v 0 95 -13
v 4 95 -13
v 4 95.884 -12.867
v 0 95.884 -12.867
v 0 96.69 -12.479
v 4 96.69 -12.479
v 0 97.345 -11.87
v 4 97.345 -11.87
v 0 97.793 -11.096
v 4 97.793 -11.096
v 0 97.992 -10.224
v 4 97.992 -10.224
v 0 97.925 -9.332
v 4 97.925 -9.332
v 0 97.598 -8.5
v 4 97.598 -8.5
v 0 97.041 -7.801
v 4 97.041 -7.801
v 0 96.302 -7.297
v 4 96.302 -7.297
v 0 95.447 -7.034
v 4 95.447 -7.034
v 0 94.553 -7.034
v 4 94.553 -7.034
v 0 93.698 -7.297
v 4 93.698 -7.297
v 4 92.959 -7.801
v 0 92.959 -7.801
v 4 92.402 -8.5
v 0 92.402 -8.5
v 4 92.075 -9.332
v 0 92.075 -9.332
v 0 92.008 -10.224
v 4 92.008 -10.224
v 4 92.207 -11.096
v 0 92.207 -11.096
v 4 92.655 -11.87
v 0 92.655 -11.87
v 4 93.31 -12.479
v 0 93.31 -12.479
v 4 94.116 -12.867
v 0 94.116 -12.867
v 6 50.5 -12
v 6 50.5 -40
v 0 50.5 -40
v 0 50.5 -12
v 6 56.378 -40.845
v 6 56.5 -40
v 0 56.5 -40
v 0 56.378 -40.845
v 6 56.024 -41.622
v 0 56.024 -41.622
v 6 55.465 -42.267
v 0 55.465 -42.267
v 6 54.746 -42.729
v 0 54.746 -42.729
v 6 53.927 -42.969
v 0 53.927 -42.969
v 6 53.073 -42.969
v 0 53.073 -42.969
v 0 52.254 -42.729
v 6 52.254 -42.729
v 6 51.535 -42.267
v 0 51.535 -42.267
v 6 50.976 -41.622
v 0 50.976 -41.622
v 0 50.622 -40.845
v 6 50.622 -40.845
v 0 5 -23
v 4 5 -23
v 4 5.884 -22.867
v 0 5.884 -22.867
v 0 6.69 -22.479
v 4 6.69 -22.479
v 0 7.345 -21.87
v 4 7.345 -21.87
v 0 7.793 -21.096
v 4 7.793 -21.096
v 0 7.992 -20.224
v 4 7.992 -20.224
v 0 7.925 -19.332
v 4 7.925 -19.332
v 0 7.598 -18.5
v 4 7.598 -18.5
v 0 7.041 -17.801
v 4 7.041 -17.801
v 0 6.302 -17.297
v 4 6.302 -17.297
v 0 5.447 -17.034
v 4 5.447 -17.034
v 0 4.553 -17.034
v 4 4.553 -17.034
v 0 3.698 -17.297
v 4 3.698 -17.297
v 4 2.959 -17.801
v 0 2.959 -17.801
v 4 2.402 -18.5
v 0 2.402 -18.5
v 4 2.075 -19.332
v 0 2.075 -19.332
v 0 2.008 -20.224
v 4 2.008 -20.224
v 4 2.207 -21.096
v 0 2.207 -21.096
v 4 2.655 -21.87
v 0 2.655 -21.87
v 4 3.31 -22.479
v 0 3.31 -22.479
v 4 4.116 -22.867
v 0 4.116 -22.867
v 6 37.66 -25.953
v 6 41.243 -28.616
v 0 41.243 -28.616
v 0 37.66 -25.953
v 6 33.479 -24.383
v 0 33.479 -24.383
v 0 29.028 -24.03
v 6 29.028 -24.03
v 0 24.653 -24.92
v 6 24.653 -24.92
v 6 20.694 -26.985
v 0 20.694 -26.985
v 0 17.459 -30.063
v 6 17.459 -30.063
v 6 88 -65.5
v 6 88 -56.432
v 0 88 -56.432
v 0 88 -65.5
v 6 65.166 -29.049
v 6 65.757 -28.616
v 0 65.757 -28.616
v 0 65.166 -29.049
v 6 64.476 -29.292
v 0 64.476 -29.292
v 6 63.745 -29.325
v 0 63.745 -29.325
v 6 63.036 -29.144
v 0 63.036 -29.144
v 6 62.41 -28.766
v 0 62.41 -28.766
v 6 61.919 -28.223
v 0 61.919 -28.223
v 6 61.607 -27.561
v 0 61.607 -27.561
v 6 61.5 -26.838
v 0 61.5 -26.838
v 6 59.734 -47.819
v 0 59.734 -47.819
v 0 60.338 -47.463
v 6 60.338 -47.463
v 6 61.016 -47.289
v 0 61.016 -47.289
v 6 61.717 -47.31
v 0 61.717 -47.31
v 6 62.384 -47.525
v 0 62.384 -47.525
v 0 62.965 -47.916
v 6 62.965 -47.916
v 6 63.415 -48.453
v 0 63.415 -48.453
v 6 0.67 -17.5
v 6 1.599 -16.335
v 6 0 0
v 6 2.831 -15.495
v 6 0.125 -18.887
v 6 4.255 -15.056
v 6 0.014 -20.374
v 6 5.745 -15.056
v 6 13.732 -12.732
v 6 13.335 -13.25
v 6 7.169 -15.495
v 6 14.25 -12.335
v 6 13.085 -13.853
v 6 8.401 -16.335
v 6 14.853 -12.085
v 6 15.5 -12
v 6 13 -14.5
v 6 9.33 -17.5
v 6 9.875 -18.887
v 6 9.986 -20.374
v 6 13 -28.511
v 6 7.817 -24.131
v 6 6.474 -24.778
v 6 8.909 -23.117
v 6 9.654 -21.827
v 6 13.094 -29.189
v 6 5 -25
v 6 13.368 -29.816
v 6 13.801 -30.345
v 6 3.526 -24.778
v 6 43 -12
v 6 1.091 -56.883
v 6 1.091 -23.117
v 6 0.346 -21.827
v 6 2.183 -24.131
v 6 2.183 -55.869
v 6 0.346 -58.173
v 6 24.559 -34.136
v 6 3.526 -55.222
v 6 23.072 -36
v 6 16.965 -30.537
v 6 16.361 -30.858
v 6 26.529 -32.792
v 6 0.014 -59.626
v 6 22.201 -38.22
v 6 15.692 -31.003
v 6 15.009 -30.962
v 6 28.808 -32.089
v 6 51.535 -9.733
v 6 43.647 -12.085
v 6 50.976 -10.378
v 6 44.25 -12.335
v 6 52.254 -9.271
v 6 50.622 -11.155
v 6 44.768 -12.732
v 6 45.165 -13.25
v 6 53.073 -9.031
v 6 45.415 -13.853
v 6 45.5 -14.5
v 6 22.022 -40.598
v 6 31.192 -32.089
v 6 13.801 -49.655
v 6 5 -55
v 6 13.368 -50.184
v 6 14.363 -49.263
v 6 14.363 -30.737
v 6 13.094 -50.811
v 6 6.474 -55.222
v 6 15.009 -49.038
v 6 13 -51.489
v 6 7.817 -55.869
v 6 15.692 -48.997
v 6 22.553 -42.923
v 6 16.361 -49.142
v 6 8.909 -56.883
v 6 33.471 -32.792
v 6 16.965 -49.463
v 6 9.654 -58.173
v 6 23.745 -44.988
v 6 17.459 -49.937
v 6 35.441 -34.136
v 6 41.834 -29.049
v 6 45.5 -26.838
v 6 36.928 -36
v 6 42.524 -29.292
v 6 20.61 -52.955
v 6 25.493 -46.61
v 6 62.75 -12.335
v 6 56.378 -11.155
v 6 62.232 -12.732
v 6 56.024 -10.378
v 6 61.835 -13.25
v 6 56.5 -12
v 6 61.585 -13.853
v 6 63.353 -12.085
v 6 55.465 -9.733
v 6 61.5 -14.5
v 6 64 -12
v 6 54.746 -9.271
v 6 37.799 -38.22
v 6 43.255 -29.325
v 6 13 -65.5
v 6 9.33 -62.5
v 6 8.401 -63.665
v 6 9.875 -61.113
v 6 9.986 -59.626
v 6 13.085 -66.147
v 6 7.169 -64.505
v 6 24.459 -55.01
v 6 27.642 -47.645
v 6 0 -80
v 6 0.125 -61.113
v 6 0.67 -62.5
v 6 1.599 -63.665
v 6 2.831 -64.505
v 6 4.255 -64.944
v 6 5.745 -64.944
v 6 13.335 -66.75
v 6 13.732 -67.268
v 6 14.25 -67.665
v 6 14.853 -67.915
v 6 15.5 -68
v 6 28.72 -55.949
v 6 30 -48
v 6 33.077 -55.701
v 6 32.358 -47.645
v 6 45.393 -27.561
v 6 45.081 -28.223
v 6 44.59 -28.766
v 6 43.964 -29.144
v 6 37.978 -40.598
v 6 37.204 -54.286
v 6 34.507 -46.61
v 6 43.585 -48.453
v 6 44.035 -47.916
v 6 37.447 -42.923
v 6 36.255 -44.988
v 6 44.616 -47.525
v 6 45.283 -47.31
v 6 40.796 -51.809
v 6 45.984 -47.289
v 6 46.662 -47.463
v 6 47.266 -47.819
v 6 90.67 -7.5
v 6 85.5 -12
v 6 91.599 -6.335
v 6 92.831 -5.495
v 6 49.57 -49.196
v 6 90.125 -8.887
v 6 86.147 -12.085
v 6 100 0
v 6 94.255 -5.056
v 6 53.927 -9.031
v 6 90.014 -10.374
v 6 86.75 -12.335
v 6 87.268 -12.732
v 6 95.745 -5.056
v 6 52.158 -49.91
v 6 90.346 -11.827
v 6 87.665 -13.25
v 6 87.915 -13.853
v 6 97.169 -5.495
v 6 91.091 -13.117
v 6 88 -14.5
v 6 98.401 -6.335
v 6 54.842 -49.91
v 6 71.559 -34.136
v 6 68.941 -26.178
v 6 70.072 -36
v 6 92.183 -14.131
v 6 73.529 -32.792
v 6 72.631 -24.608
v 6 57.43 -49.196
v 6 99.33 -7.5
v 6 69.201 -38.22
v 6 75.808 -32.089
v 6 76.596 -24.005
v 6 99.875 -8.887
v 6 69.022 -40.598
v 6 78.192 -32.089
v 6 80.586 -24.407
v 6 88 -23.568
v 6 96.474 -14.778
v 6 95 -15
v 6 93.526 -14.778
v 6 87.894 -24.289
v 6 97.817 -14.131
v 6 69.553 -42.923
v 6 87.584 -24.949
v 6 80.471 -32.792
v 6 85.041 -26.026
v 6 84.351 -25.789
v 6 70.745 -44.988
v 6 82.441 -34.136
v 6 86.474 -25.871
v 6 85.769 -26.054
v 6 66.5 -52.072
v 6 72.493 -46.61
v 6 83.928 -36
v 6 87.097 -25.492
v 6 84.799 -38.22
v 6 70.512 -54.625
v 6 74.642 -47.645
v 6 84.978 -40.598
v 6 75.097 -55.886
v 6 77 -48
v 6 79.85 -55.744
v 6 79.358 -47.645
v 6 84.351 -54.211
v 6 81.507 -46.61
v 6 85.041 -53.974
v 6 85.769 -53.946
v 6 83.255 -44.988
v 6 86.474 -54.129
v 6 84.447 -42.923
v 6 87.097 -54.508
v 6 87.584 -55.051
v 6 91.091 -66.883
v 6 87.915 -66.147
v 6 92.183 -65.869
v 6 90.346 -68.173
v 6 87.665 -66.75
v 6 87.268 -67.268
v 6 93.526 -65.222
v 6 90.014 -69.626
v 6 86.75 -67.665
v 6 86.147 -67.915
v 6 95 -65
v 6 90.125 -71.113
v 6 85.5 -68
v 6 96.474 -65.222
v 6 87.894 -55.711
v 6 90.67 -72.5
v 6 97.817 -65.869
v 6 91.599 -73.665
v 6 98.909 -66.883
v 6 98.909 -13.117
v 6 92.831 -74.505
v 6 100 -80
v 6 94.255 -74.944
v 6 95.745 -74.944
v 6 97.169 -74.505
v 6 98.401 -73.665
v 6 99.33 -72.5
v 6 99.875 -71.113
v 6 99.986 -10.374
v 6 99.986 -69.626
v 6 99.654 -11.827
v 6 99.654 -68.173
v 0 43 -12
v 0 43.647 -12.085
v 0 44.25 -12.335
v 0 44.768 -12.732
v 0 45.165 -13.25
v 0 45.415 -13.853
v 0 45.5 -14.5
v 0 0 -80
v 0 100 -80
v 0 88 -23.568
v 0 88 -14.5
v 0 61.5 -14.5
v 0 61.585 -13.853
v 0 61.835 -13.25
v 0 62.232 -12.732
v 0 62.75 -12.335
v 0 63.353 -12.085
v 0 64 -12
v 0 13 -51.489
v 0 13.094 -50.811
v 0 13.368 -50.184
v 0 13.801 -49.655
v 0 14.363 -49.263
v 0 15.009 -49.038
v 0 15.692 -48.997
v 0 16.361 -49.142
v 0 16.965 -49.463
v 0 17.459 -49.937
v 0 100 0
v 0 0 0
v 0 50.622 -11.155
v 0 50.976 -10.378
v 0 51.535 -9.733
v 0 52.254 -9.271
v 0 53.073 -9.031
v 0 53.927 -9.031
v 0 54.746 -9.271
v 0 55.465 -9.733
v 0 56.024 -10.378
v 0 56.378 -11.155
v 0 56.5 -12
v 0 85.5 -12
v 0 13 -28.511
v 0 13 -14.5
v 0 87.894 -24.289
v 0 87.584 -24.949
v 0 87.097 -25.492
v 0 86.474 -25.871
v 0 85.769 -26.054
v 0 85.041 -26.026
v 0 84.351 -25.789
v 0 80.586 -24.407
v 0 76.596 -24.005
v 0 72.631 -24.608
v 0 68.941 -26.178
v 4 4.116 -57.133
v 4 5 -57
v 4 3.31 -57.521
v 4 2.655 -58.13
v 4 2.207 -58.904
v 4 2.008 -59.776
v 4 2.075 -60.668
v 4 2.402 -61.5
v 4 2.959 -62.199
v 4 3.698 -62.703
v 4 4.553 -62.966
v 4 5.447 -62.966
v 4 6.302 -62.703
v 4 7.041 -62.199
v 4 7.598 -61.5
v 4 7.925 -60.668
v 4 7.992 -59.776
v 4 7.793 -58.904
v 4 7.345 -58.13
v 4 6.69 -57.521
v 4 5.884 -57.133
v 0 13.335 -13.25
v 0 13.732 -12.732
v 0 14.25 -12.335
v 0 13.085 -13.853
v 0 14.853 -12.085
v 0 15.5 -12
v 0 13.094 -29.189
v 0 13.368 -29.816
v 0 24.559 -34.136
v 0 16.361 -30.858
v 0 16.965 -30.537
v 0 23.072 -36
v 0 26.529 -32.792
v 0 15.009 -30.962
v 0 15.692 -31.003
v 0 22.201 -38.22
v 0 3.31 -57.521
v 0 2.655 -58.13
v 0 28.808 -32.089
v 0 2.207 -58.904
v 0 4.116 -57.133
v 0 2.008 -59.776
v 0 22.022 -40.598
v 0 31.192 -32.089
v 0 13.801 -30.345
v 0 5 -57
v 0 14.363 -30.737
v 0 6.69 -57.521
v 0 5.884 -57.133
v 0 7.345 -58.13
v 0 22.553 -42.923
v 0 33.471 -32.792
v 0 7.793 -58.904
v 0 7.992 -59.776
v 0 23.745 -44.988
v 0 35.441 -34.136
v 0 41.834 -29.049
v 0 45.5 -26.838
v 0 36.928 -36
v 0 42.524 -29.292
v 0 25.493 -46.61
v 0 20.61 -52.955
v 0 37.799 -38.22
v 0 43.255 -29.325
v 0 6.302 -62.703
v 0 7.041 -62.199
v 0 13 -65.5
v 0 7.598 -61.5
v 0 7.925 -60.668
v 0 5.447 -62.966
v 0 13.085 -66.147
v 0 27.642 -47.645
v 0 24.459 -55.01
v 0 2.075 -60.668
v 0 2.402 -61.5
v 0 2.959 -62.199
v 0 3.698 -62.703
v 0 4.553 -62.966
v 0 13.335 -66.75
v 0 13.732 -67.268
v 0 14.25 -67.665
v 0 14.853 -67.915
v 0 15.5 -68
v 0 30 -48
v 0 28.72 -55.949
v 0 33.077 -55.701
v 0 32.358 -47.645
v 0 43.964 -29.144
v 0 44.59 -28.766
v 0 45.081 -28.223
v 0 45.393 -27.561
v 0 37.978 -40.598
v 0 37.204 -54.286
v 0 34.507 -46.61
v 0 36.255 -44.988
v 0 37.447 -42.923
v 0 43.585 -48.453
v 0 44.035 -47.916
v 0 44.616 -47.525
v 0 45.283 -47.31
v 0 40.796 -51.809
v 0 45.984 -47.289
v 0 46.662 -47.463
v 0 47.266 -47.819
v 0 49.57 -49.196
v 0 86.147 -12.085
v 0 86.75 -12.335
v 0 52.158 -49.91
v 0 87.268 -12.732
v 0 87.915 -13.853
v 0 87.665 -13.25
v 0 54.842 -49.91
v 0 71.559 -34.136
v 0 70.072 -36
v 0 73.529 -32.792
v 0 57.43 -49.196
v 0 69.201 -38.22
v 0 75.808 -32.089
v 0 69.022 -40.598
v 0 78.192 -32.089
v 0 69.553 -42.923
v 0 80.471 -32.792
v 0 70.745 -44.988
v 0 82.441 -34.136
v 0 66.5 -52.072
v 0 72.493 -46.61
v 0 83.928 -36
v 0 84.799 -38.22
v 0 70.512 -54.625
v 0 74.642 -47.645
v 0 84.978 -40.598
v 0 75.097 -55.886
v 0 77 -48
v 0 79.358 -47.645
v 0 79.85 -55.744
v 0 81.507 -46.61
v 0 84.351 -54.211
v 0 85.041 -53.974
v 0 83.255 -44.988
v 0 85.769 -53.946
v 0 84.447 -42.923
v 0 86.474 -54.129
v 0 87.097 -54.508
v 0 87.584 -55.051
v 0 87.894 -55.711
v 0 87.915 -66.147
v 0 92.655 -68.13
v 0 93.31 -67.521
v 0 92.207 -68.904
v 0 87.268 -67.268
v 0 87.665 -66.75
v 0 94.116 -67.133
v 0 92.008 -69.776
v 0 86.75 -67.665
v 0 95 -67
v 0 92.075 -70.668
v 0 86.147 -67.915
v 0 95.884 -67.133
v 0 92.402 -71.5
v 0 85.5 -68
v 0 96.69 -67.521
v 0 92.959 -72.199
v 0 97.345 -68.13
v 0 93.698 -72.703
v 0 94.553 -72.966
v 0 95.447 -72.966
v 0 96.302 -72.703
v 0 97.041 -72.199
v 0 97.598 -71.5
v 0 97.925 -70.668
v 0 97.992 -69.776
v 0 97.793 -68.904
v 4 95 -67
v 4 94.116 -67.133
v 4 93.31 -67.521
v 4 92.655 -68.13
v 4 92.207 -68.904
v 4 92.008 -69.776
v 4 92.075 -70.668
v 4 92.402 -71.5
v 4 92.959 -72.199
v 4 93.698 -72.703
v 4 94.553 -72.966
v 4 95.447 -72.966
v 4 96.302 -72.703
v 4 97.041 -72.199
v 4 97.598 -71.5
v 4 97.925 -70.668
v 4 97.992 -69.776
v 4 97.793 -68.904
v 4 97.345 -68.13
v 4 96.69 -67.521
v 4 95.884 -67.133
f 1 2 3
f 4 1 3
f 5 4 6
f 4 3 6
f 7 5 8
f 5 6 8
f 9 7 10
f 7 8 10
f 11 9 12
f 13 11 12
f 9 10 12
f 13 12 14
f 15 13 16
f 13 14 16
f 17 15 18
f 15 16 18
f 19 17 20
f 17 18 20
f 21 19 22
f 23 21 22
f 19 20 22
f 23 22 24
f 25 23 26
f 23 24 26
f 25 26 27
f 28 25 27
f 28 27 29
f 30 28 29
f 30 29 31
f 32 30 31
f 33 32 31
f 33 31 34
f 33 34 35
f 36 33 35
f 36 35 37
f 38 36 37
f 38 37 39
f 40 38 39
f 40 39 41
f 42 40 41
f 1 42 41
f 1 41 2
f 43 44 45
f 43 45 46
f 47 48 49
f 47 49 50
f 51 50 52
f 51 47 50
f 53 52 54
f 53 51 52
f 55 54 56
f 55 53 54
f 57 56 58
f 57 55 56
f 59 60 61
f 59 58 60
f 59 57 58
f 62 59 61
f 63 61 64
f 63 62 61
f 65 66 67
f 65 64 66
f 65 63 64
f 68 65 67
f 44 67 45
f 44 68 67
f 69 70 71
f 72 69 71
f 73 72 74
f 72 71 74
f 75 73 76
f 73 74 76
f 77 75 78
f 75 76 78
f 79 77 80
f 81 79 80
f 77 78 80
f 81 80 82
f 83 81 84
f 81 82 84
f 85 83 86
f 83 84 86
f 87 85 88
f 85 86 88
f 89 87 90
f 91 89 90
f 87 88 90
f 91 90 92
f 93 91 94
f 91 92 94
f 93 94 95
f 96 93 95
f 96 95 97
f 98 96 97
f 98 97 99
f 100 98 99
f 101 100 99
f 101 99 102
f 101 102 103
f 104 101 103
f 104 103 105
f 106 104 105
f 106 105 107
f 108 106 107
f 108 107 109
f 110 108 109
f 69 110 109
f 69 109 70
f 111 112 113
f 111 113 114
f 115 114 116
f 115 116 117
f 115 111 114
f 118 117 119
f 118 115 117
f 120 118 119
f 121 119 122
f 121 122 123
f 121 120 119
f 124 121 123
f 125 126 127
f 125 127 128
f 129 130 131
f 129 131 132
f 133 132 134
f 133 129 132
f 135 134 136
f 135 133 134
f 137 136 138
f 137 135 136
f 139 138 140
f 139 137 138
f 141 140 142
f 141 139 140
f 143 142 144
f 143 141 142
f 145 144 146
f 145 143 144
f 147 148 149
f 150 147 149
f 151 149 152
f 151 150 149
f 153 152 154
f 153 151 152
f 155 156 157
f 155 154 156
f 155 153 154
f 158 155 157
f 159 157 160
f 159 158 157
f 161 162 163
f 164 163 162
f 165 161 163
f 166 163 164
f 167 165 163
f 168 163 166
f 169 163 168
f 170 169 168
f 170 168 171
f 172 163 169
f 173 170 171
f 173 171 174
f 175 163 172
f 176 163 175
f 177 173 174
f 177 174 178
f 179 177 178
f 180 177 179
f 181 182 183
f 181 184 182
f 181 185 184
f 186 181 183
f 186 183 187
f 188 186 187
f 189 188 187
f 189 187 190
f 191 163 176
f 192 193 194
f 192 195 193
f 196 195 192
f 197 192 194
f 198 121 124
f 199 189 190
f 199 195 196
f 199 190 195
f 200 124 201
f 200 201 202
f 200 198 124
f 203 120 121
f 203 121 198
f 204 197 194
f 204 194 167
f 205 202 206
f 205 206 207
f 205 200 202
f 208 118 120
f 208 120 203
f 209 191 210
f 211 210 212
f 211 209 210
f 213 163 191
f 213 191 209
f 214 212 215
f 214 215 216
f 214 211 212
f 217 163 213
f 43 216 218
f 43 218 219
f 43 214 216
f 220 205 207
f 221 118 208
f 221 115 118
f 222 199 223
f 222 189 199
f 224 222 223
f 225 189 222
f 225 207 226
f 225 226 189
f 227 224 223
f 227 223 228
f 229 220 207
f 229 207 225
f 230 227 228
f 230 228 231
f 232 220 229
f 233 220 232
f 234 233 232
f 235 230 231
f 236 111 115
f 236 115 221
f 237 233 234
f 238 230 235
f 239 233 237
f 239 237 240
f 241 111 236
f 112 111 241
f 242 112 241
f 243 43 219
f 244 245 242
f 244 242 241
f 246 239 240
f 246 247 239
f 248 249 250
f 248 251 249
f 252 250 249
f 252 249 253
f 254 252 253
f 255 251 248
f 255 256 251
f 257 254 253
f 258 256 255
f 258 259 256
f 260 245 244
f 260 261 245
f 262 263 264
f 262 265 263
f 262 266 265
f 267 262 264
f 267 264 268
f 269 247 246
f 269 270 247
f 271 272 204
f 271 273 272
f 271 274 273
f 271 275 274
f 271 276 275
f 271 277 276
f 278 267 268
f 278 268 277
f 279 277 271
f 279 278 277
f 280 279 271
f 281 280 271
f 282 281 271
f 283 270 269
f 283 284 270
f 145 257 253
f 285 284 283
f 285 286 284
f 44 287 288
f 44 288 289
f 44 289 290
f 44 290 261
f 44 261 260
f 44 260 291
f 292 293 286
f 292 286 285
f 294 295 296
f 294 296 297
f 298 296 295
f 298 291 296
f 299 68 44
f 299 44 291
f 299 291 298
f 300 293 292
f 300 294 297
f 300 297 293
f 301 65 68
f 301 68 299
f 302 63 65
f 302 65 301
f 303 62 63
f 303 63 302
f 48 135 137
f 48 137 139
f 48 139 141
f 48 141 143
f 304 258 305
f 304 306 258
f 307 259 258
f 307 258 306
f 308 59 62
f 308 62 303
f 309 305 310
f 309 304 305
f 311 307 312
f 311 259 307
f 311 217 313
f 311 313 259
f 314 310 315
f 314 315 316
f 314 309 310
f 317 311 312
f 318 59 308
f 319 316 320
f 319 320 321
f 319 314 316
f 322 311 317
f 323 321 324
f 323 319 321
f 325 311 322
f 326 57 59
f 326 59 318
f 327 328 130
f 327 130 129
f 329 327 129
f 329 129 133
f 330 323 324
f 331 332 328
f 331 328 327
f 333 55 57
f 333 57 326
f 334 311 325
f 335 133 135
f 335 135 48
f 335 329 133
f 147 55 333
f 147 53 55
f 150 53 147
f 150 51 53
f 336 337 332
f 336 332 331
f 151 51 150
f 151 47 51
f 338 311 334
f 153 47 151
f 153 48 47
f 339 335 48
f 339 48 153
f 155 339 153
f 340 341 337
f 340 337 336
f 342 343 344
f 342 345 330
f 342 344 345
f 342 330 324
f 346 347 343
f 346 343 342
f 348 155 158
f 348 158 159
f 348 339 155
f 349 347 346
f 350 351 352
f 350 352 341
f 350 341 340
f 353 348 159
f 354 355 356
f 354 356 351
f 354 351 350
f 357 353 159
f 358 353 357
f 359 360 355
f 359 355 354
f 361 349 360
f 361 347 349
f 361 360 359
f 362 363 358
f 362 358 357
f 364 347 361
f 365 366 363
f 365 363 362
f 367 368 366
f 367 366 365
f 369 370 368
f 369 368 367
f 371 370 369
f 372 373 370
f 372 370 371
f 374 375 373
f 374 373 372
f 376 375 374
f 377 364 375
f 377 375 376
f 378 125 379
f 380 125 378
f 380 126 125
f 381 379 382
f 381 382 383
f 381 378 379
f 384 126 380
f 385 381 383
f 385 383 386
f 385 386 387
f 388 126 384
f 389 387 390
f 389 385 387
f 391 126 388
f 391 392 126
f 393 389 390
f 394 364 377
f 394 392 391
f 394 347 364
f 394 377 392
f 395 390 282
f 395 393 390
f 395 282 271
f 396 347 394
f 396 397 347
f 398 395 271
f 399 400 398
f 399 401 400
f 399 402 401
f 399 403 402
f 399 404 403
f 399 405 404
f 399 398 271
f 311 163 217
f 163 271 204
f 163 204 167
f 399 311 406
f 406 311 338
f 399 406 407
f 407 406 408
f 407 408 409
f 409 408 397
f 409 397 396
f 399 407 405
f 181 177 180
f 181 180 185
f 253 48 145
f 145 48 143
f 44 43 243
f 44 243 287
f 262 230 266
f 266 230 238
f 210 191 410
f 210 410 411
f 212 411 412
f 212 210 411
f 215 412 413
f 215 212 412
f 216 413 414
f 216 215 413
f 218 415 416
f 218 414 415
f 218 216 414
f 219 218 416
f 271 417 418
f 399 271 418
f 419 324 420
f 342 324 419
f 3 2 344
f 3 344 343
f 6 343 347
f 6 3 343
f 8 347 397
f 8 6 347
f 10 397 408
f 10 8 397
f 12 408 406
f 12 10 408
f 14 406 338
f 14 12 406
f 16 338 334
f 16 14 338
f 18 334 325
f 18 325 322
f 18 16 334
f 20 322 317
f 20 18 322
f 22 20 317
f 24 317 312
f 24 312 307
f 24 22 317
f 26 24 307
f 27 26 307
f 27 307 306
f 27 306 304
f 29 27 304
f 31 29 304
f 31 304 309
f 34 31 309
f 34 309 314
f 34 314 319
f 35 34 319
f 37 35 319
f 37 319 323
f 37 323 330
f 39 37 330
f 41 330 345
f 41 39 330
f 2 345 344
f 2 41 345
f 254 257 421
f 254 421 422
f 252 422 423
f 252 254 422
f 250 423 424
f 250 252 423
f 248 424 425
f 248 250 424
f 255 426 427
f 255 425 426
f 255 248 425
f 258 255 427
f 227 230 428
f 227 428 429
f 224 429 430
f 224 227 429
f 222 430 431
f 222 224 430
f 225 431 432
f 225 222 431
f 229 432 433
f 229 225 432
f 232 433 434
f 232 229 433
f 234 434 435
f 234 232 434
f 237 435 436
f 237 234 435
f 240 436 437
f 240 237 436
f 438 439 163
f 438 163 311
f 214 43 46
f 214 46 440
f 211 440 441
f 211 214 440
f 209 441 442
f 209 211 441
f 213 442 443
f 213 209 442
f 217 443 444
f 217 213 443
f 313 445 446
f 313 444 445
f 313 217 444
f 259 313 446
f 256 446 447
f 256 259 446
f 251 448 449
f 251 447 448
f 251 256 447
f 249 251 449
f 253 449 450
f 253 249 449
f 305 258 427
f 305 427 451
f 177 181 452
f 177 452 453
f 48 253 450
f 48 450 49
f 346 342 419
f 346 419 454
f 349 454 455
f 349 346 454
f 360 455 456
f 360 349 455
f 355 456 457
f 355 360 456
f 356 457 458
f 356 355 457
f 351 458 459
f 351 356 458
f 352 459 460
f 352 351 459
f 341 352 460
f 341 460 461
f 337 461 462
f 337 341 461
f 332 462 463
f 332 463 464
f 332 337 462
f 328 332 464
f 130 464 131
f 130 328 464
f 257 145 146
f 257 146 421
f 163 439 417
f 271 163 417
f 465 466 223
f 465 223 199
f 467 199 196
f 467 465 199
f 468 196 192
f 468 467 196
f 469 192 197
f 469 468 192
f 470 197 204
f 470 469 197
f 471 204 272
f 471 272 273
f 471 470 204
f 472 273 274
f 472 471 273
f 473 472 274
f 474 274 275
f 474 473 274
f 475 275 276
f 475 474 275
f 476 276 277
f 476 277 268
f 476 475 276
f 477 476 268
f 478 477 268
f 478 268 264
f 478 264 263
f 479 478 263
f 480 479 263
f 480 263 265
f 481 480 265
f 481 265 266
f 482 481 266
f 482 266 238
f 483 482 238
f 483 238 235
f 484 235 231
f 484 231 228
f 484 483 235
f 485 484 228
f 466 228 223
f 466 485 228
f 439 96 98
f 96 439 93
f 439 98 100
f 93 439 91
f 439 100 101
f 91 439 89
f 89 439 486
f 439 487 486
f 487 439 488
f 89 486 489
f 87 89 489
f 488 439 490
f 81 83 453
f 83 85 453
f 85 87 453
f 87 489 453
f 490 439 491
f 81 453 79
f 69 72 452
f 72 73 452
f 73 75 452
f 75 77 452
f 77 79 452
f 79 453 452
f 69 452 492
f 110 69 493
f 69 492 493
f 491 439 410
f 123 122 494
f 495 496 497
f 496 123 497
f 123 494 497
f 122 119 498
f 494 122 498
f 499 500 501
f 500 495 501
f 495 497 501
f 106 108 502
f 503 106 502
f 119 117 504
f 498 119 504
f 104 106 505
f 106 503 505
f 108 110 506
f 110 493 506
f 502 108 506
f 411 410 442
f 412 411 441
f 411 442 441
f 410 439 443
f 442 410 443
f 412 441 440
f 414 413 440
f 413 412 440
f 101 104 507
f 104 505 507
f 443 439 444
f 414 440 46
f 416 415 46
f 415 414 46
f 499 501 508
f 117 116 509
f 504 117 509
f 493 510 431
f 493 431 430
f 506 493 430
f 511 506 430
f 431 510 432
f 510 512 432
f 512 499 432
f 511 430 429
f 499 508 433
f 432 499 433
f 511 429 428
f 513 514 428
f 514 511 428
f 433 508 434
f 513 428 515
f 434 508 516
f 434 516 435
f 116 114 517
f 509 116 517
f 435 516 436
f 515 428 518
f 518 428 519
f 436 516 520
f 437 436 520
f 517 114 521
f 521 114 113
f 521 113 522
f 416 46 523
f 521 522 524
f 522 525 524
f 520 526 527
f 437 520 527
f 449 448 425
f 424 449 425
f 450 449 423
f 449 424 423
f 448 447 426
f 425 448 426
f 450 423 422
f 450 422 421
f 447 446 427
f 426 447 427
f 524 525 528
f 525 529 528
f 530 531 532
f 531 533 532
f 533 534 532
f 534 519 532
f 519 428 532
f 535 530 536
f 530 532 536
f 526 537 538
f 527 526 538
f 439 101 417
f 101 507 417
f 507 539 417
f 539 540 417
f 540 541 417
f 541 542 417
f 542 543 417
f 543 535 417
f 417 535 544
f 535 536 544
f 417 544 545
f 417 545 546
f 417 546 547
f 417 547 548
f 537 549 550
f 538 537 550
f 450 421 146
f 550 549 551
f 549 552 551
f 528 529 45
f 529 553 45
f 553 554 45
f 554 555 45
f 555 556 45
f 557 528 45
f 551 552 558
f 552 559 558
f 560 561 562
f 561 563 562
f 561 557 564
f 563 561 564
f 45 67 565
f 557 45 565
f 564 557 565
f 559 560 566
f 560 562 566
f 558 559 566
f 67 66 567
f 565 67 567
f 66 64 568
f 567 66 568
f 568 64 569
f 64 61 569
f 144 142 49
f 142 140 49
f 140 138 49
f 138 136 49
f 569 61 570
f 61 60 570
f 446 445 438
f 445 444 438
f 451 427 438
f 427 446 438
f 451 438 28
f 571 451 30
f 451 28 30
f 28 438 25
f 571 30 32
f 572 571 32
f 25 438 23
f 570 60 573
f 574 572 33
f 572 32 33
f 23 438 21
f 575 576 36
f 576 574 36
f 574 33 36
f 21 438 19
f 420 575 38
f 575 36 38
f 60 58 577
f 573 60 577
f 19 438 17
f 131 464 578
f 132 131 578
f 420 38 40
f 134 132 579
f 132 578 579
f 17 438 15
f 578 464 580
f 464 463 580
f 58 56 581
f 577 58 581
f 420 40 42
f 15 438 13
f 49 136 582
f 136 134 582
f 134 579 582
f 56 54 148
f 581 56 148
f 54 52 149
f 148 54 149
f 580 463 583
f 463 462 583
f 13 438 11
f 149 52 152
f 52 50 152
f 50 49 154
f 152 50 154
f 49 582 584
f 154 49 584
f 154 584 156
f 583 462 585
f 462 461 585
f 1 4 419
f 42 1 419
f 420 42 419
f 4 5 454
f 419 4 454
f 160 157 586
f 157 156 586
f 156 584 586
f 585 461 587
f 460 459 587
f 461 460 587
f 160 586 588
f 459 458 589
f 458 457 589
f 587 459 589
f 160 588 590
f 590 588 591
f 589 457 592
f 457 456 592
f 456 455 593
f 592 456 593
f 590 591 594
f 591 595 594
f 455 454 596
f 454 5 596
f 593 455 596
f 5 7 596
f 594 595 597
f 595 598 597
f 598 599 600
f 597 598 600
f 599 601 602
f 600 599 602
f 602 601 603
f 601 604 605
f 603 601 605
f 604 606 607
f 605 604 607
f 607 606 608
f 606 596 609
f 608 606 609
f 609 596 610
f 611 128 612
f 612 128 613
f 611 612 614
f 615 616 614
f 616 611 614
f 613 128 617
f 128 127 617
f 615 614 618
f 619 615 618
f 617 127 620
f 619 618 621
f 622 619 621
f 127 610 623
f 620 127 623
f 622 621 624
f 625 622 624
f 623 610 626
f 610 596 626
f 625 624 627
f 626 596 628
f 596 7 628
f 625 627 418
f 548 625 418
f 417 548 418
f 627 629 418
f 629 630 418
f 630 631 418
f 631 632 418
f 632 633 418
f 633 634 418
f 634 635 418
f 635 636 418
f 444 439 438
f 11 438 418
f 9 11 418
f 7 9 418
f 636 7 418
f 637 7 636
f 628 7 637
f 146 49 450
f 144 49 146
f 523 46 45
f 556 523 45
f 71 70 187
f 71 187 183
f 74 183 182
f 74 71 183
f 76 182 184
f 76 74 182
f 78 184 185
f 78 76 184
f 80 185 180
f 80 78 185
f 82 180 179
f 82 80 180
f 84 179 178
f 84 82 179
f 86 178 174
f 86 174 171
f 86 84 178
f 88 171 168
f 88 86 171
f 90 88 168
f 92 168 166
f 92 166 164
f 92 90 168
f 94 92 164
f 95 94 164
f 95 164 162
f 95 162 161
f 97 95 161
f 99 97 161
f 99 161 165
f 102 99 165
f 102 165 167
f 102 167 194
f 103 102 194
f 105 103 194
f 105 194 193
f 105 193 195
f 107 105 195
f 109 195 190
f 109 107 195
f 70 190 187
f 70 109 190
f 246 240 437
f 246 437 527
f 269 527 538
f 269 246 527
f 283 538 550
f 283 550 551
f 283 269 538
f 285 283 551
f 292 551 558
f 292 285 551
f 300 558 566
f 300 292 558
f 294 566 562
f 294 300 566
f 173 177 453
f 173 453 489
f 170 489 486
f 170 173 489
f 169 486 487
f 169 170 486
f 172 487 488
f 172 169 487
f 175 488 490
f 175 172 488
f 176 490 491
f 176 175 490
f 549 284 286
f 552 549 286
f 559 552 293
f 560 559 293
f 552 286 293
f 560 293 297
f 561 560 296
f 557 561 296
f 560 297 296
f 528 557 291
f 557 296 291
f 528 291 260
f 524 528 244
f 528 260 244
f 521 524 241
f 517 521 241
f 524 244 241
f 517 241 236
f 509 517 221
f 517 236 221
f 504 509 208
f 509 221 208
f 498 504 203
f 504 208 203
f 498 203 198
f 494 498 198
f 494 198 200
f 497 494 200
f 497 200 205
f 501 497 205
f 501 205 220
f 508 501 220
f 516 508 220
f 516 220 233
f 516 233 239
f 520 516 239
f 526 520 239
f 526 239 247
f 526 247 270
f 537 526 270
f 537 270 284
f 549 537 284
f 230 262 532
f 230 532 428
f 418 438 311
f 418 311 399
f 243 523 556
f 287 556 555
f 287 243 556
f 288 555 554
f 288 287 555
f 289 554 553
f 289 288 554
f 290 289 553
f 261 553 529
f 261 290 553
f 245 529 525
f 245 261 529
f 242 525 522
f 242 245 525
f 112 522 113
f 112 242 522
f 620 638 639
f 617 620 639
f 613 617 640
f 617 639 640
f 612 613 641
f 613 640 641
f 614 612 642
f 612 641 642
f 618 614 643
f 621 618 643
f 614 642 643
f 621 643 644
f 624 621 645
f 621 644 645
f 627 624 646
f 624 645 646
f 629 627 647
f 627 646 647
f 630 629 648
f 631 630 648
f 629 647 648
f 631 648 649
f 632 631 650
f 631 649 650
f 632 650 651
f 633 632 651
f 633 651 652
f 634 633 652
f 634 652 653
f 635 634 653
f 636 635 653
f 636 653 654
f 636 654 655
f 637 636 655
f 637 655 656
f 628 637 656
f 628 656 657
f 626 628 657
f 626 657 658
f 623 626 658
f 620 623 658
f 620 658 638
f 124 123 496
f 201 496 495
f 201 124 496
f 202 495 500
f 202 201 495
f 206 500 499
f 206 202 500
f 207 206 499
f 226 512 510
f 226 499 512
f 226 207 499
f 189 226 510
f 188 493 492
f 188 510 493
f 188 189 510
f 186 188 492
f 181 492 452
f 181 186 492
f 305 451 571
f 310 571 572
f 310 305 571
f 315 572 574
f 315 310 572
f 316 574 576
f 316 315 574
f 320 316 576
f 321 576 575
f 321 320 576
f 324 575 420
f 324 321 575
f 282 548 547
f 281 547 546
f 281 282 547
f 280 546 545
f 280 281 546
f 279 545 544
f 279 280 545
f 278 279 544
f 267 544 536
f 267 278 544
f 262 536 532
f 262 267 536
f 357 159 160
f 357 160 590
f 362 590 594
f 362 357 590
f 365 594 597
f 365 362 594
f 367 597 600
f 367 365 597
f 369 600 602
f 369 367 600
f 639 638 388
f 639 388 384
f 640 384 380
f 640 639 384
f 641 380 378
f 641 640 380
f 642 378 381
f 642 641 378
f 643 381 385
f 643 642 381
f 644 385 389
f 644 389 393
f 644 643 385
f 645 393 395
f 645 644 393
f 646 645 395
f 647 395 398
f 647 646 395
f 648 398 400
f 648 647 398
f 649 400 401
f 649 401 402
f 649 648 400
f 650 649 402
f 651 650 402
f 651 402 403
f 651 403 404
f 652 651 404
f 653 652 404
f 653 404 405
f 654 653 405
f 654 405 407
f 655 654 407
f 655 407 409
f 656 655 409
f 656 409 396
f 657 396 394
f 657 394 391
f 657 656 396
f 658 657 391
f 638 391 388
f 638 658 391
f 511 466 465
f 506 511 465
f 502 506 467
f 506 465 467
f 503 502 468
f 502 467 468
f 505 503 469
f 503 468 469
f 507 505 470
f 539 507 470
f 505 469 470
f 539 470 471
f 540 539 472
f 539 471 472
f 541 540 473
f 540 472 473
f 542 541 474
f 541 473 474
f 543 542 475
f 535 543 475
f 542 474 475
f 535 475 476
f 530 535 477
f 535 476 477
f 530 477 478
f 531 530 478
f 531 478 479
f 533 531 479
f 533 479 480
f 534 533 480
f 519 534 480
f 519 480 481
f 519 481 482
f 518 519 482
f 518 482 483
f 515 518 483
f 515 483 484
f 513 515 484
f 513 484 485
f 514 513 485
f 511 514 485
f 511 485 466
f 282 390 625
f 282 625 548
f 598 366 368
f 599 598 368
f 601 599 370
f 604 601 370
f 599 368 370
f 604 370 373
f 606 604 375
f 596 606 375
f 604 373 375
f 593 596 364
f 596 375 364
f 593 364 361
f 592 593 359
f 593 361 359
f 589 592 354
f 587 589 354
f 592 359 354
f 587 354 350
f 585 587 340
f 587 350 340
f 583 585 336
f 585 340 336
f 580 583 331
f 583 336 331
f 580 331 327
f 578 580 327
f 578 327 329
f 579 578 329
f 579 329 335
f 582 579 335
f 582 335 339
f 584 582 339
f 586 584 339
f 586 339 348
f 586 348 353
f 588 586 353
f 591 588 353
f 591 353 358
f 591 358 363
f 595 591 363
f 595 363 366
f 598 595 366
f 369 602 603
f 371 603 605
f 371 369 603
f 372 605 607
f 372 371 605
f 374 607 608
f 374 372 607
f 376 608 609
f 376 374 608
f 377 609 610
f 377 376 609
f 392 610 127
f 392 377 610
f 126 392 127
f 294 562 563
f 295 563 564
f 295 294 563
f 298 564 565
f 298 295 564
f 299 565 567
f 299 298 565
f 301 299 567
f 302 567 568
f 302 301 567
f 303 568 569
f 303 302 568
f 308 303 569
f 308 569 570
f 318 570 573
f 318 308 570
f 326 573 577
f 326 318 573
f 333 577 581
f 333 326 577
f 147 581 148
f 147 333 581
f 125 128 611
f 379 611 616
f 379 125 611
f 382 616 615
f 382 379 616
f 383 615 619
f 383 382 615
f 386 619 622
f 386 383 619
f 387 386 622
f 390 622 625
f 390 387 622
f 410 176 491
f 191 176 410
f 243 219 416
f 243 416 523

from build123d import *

# Parameters (mm, degrees)
ESQUISSE1_W      = 80
ESQUISSE1_H      = 100
EXTRUSION1_DEPTH = 6
ESQUISSE2_R      = 8
EXTRUSION3_DEPTH = 129.202964084
ESQUISSE3_R      = 3
EXTRUSION4_DEPTH = 129.202964084
EXTRUSION5_DEPTH = 129.202964084
CHANFREIN1_SIZE  = 2


with BuildPart() as part:
    # Esquisse1 → Extrusion1 (new body)
    with BuildSketch(Plane(origin=(0, 0, 0), x_dir=(0, 0, -1), z_dir=(1, 0, 0))):
        with Locations((40, 50)):
            Rectangle(ESQUISSE1_W, ESQUISSE1_H)
    extrude(amount=EXTRUSION1_DEPTH)

    # Esquisse2 → Extrusion3 (cut, through all)
    with BuildSketch(Plane(origin=(6, 0, 0), x_dir=(0, 0, -1), z_dir=(1, 0, 0))):
        with Locations((40, 77)):
            Circle(ESQUISSE2_R)
        with Locations((40, 30)):
            Circle(ESQUISSE2_R)
    extrude(amount=-EXTRUSION3_DEPTH, mode=Mode.SUBTRACT)

    # Esquisse3 → Extrusion4 (cut, through all)
    with BuildSketch(Plane(origin=(6, 0, 0), x_dir=(0, 0, -1), z_dir=(1, 0, 0))):
        with Locations((10, 95)):
            Circle(ESQUISSE3_R)
        with Locations(Location((70, 95, 0), (0, 0, 180))):
            Circle(ESQUISSE3_R)
        with Locations((20, 5)):
            Circle(ESQUISSE3_R)
        with Locations(Location((60, 5, 0), (0, 0, 180))):
            Circle(ESQUISSE3_R)
    extrude(amount=-EXTRUSION4_DEPTH, mode=Mode.SUBTRACT)

    # Esquisse4 → Extrusion5 (cut, through all)
    with BuildSketch(Plane(origin=(6, 0, 0), x_dir=(0, 0, -1), z_dir=(1, 0, 0))):
        with BuildLine():
            Line((14.5, 88), (23.568323275, 88))
            ThreePointArc((23.568323275, 88), (25.703928765, 86.799688112), (25.78882013, 84.351351351))
            ThreePointArc((25.78882013, 84.351351351), (24.18182416, 74.59473222), (28.616262416, 65.756756757))
            ThreePointArc((28.616262416, 65.756756757), (29.144270989, 63.036125499), (26.837553419, 61.5))
            Line((26.837553419, 61.5), (14.5, 61.5))
            ThreePointArc((14.5, 61.5), (12.732233047, 62.232233047), (12, 64))
            Line((12, 64), (12, 85.5))
            ThreePointArc((12, 85.5), (12.732233047, 87.267766953), (14.5, 88))
        make_face()
        with BuildLine():
            Line((12, 56.5), (40, 56.5))
            ThreePointArc((40, 56.5), (43, 53.5), (40, 50.5))
            Line((40, 50.5), (12, 50.5))
            ThreePointArc((12, 50.5), (9, 53.5), (12, 56.5))
        make_face()
        with BuildLine():
            Line((14.5, 45.5), (26.837553419, 45.5))
            ThreePointArc((26.837553419, 45.5), (29.144270989, 43.963874501), (28.616262416, 41.243243243))
            ThreePointArc((28.616262416, 41.243243243), (24.029537881, 29.028228573), (30.063459206, 17.459459459))
            ThreePointArc((30.063459206, 17.459459459), (30.871875411, 14.678005063), (28.510874707, 13))
            Line((28.510874707, 13), (14.5, 13))
            ThreePointArc((14.5, 13), (12.732233047, 13.732233047), (12, 15.5))
            Line((12, 15.5), (12, 43))
            ThreePointArc((12, 43), (12.732233047, 44.767766953), (14.5, 45.5))
        make_face()
        with BuildLine():
            Line((65.5, 13), (51.489125293, 13))
            ThreePointArc((51.489125293, 13), (49.128124589, 14.678005063), (49.936540794, 17.459459459))
            ThreePointArc((49.936540794, 17.459459459), (55.974264455, 30.907124639), (48.452969685, 43.584818861))
            ThreePointArc((48.452969685, 43.584818861), (47.310016798, 45.28313862), (47.818996959, 47.265957447))
            ThreePointArc((47.818996959, 47.265957447), (50, 53.5), (47.818996959, 59.734042553))
            ThreePointArc((47.818996959, 59.734042553), (47.310016798, 61.71686138), (48.452969685, 63.415181139))
            ThreePointArc((48.452969685, 63.415181139), (55.427142463, 72.756973317), (54.21117987, 84.351351351))
            ThreePointArc((54.21117987, 84.351351351), (54.296071235, 86.799688112), (56.431676725, 88))
            Line((56.431676725, 88), (65.5, 88))
            ThreePointArc((65.5, 88), (67.267766953, 87.267766953), (68, 85.5))
            Line((68, 85.5), (68, 15.5))
            ThreePointArc((68, 15.5), (67.267766953, 13.732233047), (65.5, 13))
        make_face()
    extrude(amount=-EXTRUSION5_DEPTH, mode=Mode.SUBTRACT)

    # Chanfrein1
    chanfrein1_edges = [part.edges().sort_by_distance(p)[0] for p in [
        (6, 95, -7),
        (6, 95, -73),
        (6, 5, -17),
        (6, 5, -63),
    ]]
    chamfer(chanfrein1_edges, length=CHANFREIN1_SIZE - 0.0001)  # a hair under: the kernel refuses the full size


solid = part.part
